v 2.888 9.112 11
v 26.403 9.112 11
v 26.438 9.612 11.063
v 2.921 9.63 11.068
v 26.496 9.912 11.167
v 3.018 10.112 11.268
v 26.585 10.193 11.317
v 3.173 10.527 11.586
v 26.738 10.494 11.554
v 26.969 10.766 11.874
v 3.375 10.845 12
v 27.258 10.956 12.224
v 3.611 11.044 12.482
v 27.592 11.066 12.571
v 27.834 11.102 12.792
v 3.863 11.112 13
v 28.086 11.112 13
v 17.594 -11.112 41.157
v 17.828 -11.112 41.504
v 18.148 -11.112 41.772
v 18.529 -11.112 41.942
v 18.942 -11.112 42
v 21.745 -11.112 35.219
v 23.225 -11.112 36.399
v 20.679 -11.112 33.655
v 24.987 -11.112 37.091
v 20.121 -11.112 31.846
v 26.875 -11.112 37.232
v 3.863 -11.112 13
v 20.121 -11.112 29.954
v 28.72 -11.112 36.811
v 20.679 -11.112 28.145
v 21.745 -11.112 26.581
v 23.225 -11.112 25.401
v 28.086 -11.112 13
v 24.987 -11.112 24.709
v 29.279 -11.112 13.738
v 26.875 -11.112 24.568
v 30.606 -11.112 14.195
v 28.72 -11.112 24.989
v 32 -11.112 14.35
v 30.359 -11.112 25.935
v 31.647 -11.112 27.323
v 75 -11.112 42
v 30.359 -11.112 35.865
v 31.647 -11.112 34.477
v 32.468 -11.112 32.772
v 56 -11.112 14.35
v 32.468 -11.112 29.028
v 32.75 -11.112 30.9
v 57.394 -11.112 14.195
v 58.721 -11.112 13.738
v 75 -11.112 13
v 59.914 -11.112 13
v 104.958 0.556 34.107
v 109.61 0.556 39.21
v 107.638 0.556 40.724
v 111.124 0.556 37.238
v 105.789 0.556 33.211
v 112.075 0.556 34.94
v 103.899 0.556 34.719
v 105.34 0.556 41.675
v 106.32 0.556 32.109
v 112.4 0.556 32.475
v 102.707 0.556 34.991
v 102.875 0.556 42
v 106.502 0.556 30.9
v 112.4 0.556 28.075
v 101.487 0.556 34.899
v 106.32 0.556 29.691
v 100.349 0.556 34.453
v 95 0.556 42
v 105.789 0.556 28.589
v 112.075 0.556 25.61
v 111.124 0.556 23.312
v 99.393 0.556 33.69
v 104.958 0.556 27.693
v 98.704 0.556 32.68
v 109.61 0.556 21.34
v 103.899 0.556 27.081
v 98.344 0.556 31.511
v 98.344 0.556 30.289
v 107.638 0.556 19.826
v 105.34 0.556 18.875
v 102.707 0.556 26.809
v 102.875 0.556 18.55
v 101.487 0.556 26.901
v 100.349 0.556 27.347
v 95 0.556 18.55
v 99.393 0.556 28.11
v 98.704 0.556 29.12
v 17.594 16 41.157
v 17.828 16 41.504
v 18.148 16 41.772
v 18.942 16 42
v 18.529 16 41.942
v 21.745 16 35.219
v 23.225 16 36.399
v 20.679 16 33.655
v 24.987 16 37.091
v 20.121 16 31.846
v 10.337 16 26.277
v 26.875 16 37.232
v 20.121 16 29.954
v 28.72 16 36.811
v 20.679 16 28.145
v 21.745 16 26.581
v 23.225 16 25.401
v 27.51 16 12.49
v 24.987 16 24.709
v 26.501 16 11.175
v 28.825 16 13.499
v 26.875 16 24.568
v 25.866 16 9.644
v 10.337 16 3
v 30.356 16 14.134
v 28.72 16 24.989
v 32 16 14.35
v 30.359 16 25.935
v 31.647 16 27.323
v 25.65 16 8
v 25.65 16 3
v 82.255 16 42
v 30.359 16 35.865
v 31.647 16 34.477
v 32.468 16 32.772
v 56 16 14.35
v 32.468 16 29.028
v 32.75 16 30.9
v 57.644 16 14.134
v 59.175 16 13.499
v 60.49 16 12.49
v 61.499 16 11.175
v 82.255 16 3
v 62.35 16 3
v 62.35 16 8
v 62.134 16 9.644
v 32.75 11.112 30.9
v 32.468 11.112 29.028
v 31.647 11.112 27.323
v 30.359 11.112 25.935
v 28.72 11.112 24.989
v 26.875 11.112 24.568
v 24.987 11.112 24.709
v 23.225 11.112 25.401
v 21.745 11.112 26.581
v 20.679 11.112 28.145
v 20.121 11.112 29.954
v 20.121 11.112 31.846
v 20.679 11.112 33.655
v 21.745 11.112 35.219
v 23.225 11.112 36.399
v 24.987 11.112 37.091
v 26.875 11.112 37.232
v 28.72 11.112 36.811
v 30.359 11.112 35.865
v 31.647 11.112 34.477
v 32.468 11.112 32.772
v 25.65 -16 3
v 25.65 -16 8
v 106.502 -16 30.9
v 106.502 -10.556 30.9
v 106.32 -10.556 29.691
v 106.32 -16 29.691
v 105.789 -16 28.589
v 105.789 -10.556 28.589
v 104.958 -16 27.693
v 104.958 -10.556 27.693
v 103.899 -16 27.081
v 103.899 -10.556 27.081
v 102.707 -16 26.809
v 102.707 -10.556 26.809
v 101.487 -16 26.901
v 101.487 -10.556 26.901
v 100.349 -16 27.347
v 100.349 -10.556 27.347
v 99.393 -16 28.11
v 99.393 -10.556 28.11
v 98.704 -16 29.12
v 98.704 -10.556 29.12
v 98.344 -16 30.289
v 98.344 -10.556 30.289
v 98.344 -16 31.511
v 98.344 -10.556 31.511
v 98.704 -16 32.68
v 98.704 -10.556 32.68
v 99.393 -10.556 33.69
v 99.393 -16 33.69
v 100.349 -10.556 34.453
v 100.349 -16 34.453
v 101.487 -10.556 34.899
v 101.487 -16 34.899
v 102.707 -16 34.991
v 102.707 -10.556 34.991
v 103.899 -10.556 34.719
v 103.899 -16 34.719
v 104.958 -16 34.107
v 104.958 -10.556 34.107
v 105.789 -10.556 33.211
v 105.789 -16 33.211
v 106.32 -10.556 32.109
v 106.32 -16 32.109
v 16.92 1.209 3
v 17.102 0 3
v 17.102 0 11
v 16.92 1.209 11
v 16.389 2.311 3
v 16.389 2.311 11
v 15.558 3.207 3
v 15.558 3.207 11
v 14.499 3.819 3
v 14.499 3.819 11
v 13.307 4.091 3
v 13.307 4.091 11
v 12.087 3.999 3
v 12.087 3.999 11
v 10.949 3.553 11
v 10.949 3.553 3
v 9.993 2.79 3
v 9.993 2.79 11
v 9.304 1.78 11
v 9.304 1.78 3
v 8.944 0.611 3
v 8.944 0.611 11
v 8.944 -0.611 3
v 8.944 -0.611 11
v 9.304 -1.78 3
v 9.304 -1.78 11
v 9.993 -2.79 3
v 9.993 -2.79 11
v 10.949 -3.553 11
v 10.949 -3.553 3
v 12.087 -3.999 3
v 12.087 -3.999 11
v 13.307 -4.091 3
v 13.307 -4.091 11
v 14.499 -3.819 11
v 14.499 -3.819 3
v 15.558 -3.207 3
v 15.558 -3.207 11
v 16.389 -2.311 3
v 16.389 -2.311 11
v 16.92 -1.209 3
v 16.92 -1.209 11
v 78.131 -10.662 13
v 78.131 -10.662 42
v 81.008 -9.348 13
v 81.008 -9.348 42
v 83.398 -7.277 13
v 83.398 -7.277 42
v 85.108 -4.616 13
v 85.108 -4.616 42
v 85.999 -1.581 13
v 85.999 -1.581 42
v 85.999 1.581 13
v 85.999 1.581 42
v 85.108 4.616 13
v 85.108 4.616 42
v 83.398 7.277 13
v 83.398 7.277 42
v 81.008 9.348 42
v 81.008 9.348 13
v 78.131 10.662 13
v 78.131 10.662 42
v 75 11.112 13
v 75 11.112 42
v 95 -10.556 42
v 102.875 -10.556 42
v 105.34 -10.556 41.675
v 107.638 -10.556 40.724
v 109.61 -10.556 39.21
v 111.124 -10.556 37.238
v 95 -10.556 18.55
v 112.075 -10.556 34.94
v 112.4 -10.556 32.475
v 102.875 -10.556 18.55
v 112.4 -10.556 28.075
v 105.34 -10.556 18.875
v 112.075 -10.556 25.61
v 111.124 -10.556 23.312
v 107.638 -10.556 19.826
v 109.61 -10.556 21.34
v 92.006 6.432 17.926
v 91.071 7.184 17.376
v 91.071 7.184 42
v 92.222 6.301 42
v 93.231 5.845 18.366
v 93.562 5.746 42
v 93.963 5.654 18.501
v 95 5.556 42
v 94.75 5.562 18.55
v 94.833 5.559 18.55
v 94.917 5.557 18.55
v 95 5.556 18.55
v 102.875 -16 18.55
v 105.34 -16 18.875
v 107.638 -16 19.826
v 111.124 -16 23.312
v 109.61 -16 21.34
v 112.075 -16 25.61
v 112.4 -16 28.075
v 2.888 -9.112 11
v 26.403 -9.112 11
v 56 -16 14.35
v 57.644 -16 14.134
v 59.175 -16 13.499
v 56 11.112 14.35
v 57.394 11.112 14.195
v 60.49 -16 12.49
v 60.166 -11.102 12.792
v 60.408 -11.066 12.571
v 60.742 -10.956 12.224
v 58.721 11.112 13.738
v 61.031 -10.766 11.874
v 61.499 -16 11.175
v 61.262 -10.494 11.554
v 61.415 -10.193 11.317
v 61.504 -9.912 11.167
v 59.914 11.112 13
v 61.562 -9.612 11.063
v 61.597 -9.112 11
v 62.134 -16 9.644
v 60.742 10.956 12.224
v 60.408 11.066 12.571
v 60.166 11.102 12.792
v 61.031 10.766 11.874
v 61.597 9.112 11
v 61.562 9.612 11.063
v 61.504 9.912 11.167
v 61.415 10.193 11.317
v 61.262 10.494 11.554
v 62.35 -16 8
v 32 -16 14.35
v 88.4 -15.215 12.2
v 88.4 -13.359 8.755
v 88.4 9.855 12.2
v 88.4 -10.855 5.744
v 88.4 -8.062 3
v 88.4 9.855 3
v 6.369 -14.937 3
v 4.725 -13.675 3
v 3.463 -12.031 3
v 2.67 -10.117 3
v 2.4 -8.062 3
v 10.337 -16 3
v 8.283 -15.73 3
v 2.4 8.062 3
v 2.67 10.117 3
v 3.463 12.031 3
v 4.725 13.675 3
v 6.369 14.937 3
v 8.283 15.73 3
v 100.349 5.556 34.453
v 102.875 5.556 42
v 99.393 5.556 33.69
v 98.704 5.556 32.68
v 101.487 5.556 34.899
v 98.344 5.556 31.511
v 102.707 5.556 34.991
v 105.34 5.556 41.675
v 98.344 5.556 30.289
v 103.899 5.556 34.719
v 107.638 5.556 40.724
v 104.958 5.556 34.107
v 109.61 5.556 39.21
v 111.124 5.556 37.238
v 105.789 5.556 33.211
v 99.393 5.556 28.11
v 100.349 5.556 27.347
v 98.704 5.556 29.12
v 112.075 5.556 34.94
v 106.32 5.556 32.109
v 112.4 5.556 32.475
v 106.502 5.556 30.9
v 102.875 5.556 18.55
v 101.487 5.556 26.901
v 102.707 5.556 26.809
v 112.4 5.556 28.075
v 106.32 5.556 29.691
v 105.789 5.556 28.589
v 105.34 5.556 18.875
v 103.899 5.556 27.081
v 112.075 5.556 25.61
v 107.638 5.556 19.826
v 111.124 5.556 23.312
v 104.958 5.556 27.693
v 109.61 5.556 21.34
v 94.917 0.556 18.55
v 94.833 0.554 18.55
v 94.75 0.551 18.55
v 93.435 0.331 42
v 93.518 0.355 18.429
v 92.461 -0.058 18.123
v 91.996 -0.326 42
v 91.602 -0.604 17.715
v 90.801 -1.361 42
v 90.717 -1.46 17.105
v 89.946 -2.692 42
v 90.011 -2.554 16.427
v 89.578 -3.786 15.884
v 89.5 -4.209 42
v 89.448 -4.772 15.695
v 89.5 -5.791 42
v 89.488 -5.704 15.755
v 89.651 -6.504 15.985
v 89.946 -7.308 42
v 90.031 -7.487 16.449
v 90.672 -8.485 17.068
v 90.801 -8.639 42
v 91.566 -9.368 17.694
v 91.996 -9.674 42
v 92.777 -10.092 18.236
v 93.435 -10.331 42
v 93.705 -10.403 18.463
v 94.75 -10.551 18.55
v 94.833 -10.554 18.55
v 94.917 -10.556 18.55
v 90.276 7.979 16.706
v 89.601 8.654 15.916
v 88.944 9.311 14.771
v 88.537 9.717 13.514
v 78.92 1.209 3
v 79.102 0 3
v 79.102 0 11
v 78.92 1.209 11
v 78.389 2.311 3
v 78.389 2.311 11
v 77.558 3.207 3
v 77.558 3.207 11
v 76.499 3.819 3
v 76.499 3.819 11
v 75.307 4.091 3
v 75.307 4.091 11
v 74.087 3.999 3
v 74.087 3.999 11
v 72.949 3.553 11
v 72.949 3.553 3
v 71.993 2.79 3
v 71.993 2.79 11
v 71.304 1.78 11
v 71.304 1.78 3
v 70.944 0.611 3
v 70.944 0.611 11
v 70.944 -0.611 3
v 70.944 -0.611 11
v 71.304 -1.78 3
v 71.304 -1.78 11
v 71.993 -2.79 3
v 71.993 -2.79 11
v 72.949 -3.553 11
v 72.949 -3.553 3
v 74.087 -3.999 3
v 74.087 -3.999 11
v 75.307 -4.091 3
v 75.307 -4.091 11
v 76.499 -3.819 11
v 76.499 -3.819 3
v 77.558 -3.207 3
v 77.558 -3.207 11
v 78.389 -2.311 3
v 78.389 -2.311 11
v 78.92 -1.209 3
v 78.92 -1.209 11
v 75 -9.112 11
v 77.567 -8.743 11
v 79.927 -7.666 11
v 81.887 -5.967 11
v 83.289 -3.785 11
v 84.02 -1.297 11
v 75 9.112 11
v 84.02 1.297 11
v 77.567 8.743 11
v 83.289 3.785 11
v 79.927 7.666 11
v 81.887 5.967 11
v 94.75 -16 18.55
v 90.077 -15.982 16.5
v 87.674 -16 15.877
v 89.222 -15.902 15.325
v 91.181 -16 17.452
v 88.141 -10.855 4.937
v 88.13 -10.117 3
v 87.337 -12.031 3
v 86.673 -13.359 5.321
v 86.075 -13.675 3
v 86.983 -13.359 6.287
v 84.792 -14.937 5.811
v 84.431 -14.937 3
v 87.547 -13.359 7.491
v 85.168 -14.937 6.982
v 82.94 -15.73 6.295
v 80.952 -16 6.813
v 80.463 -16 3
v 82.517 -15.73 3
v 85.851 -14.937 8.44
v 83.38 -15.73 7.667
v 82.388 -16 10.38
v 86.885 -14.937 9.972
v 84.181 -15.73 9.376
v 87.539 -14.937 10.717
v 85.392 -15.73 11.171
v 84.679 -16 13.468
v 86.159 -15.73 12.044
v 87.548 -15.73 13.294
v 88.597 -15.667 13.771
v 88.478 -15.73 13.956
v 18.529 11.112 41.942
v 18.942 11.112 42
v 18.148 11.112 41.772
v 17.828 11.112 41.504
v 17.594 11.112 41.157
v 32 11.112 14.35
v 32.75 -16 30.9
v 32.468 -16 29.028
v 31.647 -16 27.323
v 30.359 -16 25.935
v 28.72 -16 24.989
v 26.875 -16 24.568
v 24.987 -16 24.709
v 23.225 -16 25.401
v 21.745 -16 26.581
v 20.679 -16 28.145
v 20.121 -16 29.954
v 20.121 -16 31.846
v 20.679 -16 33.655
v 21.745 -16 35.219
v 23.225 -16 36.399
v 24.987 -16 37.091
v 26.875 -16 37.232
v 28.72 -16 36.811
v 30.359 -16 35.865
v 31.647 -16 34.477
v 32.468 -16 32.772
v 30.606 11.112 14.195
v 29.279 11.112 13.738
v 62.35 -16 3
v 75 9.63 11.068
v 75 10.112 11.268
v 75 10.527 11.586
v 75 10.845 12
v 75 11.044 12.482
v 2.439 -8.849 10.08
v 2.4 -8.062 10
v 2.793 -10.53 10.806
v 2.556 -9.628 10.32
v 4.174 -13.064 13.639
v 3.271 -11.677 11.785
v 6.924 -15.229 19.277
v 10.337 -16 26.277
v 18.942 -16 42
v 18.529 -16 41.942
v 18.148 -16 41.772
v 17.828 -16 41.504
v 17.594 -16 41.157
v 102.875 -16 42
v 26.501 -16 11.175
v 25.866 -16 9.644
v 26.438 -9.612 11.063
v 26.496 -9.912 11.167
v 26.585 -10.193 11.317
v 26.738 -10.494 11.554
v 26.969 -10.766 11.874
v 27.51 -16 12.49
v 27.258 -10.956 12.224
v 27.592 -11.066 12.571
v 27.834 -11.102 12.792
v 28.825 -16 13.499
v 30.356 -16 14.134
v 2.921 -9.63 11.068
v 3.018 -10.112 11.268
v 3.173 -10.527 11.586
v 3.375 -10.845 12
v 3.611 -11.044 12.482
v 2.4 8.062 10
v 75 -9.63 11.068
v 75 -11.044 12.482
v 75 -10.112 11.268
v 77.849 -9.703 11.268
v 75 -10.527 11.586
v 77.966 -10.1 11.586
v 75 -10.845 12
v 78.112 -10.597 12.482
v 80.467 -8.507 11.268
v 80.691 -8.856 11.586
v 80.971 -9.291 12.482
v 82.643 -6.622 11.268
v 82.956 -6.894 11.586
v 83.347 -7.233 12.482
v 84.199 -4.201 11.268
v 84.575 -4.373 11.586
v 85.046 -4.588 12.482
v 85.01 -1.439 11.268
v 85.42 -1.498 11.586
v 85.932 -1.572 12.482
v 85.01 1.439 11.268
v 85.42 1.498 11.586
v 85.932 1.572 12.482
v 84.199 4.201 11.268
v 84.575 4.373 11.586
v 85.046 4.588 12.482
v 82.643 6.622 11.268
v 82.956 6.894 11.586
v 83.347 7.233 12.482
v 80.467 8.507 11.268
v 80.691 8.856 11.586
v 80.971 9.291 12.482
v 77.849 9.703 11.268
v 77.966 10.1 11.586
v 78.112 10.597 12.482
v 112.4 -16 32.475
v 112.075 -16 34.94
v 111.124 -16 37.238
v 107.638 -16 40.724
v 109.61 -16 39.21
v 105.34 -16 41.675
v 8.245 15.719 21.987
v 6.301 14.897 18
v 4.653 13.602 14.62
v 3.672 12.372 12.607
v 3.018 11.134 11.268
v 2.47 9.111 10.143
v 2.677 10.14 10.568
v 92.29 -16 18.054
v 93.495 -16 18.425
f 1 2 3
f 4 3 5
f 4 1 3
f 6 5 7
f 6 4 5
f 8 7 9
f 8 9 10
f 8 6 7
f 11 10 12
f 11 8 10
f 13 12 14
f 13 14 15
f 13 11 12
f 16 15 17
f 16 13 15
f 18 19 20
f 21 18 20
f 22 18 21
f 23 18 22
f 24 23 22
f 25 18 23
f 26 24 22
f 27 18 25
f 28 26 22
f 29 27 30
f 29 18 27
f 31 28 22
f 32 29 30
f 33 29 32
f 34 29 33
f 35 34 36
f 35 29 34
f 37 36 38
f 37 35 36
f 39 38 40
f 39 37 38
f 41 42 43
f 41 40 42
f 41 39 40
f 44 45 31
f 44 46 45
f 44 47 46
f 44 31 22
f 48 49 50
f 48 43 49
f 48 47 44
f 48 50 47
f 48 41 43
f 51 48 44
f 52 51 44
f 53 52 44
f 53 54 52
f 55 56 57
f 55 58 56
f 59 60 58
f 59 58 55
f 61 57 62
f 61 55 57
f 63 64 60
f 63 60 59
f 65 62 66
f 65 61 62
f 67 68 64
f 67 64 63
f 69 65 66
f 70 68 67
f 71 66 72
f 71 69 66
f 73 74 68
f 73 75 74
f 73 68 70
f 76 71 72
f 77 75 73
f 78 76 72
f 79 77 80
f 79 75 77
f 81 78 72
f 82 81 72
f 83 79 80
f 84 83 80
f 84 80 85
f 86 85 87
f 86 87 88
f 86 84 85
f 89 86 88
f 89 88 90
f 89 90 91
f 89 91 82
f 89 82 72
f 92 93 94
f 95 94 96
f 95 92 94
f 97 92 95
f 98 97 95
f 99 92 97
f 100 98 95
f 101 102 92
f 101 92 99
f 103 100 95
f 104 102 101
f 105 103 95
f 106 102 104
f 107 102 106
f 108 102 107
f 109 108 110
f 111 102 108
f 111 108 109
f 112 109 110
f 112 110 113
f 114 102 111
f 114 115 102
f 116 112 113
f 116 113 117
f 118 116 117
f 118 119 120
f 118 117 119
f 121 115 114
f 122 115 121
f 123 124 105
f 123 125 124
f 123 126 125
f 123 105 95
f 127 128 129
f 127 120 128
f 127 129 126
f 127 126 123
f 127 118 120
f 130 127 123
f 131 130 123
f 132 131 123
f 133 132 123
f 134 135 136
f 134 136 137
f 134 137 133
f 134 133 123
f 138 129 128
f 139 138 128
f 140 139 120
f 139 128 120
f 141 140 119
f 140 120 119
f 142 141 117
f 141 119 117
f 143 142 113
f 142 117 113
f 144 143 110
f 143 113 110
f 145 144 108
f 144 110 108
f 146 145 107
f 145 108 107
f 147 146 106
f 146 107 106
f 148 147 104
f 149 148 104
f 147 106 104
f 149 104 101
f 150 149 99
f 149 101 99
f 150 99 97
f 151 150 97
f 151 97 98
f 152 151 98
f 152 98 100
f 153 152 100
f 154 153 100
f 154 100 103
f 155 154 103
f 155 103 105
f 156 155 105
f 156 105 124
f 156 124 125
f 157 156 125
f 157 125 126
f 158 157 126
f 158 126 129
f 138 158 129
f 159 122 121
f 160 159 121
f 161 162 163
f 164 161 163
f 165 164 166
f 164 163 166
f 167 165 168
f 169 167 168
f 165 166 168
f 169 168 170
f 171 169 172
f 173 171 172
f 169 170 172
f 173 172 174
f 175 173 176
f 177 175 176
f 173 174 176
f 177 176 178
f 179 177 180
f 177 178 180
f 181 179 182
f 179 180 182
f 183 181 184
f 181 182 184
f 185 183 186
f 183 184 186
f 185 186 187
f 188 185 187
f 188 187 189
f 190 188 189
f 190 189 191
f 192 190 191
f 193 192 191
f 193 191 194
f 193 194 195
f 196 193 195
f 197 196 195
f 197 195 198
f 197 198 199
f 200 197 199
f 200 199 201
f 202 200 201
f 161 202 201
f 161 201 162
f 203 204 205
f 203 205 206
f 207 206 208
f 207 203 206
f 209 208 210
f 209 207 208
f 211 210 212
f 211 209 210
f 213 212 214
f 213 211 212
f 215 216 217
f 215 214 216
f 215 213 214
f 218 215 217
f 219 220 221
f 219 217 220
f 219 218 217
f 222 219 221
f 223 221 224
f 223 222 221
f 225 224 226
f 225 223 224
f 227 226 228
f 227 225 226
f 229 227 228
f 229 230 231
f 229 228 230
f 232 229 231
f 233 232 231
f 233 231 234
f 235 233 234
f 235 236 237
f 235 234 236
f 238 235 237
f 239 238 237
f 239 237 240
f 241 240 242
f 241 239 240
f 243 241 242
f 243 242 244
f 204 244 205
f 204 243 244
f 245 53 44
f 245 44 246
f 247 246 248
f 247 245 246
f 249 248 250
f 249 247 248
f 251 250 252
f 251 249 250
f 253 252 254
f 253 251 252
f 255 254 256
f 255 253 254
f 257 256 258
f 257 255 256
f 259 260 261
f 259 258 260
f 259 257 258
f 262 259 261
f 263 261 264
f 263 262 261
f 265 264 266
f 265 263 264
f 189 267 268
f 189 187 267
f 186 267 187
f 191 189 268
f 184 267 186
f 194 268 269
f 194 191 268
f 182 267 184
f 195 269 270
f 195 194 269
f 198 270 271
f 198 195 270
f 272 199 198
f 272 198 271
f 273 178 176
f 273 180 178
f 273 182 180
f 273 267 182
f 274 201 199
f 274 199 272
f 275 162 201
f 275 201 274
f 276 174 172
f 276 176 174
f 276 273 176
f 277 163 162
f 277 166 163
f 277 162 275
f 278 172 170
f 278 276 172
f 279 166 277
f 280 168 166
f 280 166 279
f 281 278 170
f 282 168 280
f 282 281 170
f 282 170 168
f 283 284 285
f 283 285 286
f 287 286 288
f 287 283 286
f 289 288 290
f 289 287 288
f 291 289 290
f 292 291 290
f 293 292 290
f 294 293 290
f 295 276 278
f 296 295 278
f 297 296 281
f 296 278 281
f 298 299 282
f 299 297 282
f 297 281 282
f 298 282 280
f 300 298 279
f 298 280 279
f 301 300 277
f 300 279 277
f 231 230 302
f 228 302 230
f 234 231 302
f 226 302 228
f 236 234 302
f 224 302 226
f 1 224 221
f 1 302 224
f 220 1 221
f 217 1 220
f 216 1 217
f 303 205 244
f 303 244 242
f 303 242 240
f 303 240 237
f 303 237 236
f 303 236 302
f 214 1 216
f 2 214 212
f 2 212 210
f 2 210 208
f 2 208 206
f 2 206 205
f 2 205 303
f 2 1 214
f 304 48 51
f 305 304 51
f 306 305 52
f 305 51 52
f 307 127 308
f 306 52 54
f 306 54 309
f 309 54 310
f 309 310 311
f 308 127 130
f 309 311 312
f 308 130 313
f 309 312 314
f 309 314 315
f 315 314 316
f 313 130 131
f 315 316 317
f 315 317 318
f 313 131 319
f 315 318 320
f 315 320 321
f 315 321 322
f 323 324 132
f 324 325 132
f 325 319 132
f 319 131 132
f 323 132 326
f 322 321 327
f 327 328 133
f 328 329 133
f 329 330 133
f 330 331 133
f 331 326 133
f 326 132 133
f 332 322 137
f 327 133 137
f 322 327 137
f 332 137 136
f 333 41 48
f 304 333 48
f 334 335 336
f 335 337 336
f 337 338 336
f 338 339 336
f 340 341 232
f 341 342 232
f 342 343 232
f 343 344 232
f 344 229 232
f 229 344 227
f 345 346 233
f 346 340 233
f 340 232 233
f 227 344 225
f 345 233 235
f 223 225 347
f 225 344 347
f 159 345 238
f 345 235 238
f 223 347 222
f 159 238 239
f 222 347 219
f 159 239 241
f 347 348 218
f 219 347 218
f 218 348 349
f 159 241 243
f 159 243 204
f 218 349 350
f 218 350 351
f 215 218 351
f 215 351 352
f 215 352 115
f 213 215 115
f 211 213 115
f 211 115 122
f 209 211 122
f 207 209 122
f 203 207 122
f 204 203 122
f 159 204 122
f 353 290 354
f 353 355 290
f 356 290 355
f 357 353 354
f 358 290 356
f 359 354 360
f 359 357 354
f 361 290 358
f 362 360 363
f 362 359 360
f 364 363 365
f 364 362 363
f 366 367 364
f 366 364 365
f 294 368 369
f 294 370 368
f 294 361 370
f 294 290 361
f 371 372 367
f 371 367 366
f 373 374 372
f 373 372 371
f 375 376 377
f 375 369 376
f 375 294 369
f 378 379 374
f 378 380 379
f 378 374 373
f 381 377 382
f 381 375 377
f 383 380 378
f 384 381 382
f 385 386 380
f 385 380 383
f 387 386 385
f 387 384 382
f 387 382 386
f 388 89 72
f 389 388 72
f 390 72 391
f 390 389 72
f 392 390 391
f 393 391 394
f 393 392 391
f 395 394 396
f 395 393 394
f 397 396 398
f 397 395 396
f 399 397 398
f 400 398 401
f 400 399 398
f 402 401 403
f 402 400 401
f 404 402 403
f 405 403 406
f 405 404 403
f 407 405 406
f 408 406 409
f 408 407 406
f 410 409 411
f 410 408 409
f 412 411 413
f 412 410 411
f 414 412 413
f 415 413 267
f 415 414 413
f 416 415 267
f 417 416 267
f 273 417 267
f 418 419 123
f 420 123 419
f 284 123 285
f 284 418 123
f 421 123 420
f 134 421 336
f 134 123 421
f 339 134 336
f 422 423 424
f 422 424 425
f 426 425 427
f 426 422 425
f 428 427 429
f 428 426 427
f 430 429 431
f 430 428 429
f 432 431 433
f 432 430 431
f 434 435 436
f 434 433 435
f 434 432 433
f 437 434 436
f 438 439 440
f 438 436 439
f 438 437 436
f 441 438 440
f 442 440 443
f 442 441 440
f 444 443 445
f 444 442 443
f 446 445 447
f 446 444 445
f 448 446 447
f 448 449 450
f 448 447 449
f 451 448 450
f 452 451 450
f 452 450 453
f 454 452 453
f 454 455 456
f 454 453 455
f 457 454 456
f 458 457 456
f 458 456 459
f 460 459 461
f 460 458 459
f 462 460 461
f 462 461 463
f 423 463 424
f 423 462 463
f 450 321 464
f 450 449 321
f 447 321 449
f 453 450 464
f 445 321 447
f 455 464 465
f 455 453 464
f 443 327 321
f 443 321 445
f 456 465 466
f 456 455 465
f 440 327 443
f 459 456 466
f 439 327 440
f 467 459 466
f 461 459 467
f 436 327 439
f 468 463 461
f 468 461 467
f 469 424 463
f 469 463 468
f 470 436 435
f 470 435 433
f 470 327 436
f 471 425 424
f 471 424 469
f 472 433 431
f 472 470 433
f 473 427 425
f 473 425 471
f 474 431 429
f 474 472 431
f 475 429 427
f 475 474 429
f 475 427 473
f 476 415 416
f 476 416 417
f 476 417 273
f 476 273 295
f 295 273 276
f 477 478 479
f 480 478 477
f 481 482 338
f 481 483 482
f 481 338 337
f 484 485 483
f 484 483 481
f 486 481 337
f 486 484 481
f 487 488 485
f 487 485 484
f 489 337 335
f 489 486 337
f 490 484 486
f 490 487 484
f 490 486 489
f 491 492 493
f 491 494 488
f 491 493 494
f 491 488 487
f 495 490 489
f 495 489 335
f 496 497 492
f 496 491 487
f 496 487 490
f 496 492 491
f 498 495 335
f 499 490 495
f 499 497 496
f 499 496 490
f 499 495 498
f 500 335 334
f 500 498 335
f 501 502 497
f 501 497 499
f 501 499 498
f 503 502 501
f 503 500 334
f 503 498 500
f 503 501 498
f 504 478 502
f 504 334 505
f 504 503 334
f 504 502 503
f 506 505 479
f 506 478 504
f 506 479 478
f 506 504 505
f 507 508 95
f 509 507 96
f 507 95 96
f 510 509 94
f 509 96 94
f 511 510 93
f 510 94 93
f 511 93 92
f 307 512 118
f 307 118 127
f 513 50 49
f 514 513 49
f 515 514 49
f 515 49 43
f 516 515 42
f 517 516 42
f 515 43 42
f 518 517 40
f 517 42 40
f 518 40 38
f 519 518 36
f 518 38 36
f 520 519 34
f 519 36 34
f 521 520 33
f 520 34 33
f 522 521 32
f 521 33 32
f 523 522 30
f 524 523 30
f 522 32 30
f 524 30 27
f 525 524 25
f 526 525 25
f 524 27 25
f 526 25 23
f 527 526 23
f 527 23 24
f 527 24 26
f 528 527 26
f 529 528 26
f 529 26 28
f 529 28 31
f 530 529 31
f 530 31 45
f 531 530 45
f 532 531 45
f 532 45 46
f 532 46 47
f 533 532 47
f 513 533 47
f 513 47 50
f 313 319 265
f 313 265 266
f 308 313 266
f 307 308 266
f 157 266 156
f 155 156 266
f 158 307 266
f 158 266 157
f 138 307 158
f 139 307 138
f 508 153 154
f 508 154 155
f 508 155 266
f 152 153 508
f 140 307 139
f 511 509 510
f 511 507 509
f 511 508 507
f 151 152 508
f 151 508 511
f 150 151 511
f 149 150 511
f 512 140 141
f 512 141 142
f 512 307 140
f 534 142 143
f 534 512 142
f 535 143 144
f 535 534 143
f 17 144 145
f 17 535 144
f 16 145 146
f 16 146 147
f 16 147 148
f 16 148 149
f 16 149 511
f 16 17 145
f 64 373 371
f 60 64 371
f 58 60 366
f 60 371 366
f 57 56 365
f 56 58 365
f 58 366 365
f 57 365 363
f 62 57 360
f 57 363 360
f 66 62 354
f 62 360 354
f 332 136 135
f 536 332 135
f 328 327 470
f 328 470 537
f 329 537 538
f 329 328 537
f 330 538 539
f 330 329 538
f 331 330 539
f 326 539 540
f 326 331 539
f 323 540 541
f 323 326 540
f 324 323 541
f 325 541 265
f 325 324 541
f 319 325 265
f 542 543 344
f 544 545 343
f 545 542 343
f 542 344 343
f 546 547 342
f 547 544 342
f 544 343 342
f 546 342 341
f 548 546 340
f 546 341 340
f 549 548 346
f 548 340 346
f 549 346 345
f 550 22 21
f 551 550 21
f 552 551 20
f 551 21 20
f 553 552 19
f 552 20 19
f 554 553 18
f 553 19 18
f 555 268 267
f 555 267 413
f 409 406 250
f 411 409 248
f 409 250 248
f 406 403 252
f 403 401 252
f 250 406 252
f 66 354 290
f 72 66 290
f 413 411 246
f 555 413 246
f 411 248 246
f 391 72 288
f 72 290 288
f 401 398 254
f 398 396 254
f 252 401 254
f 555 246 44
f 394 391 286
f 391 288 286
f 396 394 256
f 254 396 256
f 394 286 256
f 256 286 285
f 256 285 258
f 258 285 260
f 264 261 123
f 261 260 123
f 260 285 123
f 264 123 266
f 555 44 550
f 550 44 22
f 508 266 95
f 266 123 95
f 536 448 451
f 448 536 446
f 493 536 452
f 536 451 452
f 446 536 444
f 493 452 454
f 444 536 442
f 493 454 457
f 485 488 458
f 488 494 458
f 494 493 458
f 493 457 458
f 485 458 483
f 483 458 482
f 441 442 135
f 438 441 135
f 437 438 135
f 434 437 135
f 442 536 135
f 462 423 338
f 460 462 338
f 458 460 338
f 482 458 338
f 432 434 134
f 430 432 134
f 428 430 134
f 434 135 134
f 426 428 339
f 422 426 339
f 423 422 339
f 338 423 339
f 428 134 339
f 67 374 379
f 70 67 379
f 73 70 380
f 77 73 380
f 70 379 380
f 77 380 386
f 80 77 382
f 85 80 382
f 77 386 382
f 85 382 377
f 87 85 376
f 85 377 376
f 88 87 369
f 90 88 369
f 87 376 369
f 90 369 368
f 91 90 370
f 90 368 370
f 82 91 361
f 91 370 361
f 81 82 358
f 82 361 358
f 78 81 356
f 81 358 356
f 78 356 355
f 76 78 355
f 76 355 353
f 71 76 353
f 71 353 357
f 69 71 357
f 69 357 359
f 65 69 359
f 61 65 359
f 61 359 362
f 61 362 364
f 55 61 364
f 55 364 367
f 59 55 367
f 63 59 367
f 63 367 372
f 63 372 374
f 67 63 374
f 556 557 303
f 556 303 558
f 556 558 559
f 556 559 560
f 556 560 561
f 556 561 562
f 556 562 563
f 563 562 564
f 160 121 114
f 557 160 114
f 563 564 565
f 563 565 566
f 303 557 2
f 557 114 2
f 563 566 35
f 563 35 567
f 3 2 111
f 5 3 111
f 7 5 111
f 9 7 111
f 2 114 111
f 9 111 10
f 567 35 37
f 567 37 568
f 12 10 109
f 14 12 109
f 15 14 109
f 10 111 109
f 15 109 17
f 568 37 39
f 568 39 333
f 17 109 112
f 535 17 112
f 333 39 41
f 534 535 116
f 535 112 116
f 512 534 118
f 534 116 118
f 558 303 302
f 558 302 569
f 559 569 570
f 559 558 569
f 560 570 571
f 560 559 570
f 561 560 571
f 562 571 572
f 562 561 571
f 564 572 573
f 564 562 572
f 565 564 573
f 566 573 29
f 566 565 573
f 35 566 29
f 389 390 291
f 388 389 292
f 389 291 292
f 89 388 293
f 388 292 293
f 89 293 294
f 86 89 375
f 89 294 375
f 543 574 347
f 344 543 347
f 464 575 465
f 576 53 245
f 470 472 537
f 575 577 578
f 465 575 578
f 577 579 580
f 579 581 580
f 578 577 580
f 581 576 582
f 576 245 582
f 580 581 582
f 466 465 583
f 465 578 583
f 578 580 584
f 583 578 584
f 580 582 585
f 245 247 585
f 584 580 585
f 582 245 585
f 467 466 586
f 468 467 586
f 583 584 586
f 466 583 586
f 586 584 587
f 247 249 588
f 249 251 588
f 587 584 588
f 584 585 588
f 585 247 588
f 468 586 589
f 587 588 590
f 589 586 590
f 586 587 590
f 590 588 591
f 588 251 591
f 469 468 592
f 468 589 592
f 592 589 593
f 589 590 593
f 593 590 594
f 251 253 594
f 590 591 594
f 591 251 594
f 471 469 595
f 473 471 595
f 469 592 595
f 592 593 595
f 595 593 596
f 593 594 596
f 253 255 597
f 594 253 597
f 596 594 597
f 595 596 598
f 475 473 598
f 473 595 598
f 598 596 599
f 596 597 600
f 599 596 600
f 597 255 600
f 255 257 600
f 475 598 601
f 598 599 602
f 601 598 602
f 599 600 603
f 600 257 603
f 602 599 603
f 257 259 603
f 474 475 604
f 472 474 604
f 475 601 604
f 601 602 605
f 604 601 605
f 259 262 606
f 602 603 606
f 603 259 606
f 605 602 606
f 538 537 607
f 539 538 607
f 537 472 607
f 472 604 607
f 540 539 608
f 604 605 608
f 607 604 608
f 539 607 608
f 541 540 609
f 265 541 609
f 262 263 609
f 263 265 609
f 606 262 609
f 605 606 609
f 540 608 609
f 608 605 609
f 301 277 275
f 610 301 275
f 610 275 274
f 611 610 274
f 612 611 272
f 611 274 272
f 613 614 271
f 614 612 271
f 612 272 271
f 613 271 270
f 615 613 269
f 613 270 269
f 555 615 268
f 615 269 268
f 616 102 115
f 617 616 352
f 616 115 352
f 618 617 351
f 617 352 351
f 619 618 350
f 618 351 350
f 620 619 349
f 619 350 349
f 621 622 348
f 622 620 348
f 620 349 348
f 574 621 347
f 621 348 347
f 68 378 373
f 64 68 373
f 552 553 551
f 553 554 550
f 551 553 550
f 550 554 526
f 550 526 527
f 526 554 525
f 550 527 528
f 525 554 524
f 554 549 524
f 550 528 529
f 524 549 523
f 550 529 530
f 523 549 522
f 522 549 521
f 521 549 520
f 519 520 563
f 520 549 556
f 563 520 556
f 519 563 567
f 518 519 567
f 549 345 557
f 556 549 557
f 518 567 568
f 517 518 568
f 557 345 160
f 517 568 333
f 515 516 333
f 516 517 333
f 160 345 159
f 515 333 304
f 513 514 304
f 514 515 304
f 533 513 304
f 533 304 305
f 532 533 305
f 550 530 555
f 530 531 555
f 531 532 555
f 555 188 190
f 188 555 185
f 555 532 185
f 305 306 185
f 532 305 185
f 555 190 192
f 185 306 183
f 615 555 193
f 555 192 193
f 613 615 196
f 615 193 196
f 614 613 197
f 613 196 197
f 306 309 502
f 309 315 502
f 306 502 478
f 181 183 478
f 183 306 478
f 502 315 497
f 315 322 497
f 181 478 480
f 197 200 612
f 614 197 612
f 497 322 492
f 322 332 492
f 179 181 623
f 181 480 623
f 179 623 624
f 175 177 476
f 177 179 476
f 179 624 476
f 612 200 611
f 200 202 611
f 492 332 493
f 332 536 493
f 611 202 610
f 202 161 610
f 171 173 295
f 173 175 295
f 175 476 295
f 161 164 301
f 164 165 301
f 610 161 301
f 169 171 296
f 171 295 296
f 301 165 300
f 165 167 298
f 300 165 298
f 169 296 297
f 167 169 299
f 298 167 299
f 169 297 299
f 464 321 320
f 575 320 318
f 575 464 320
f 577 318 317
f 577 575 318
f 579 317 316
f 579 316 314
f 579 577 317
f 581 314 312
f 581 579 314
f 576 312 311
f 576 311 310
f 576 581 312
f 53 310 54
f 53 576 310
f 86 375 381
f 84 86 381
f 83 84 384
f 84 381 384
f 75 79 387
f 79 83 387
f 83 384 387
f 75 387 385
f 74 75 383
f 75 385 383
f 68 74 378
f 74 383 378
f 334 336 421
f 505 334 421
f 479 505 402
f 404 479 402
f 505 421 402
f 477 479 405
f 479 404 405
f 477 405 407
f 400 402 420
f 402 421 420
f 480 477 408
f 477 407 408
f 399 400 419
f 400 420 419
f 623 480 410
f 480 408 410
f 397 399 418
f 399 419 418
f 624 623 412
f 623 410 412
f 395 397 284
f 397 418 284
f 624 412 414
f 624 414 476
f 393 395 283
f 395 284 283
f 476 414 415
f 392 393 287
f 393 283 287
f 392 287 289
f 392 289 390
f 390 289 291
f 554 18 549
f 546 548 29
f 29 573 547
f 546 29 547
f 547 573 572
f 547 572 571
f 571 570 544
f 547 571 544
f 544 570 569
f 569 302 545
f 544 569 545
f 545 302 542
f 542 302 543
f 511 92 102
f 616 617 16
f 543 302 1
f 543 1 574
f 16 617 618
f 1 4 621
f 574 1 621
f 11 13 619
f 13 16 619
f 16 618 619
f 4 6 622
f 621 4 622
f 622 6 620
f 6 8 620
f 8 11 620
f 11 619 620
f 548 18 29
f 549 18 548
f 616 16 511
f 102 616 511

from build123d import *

# Parameters (mm, degrees)
SKETCH1_W               = 120
SKETCH1_H               = 32
EXTRUDE1_DEPTH          = 75
CUT_EXTRUDE4_START      = 8
SKETCH2_OUTSIDE_W       = 151.016
SKETCH2_OUTSIDE_H       = 63.016
CUT_EXTRUDE4_DEPTH      = 68
EXTRUDE7_DEPTH          = 36.5252
SKETCH6_R               = 6.35
SKETCH6_R_2             = 4.1021
EXTRUDE4_DEPTH          = 33
SKETCH8_OUTSIDE_W       = 151.016
SKETCH8_OUTSIDE_H       = 106.016
EXTRUDE8_DEPTH          = 33
SKETCH9_R               = 4.1021
CUT_EXTRUDE1_DEPTH      = 43.0000001
FILLET6_R               = 2
CUT_EXTRUDE2_DEPTH      = 17
CUT_EXTRUDE2_DEPTH_BACK = 17.0000001
SKETCH16_OUTSIDE_W      = 136.204
SKETCH16_OUTSIDE_H      = 58.204
CUT_EXTRUDE7_DEPTH      = 43.0000001


with BuildPart() as part:
    # Sketch1 → Extrude1 (new body)
    with BuildSketch(Plane.XY.offset(3)):
        with Locations((60, 0)):
            Rectangle(SKETCH1_W, SKETCH1_H)
    extrude(amount=EXTRUDE1_DEPTH)

    # Sketch2 outside → Cut-Extrude4 (cut, through all)
    with BuildSketch(Plane.XY.offset(3).offset(CUT_EXTRUDE4_START)):
        with Locations((60, 0)):
            Rectangle(SKETCH2_OUTSIDE_W, SKETCH2_OUTSIDE_H)
        with BuildLine():
            Line((0, 16), (82.254775894, 16))
            Line((82.254775894, 16), (91.071137947, 7.183637947))
            ThreePointArc((91.071137947, 7.183637947), (92.873715179, 5.979194347), (95, 5.55625))
            Line((95, 5.55625), (120, 5.55625))
            Line((120, 5.55625), (120, 0.55625))
            Line((120, 0.55625), (95, 0.55625))
            ThreePointArc((95, 0.55625), (89.44375, -5), (95, -10.55625))
            Line((95, -10.55625), (120, -10.55625))
            Line((120, -10.55625), (120, -16))
            Line((120, -16), (0, -16))
            Line((0, -16), (0, -11.1125))
            Line((0, -11.1125), (75, -11.1125))
            ThreePointArc((75, -11.1125), (86.1125, 0), (75, 11.1125))
            Line((75, 11.1125), (0, 11.1125))
            Line((0, 11.1125), (0, 16))
        make_face(mode=Mode.SUBTRACT)
    extrude(amount=CUT_EXTRUDE4_DEPTH, mode=Mode.SUBTRACT)

    # Sketch7 → Extrude7 (cut)
    with BuildSketch(Plane.XY):
        with BuildLine():
            Line((95, 5.55625), (120, 5.55625))
            Line((120, 5.55625), (133.084512724, 5.55625))
            Line((133.084512724, 5.55625), (133.084512724, 22.23007271))
            Line((133.084512724, 22.23007271), (82.254775894, 22.23007271))
            Line((82.254775894, 22.23007271), (82.254775894, 16))
            Line((82.254775894, 16), (91.071137947, 7.183637947))
            ThreePointArc((91.071137947, 7.183637947), (92.873715179, 5.979194347), (95, 5.55625))
        make_face()
    extrude(amount=EXTRUDE7_DEPTH, mode=Mode.SUBTRACT)

    # Sketch6 → Extrude4 (cut, through all)
    with BuildSketch(Plane(origin=(0, 16, 0), x_dir=(1, 0, 0), z_dir=(0, 1, 0))):
        with Locations((26.4, -30.9)):
            Circle(SKETCH6_R)
        with Locations((102.4, -30.9)):
            Circle(SKETCH6_R_2)
    extrude(amount=-EXTRUDE4_DEPTH, mode=Mode.SUBTRACT)

    # Sketch8 outside → Extrude8 (cut, through all)
    with BuildSketch(Plane(origin=(0, 16, 0), x_dir=(1, 0, 0), z_dir=(0, 1, 0))):
        with Locations((60, -40.5)):
            Rectangle(SKETCH8_OUTSIDE_W, SKETCH8_OUTSIDE_H)
        with BuildLine():
            Line((17.594193491, -41.157475527), (2.4, -10))
            Line((2.4, -10), (2.4, 17.886579673))
            Line((2.4, 17.886579673), (88.4, 17.886579673))
            Line((88.4, 17.886579673), (88.4, -12.2))
            ThreePointArc((88.4, -12.2), (90.259871939, -16.690128061), (94.75, -18.55))
            Line((94.75, -18.55), (102.875, -18.55))
            ThreePointArc((102.875, -18.55), (109.610192091, -21.339807909), (112.4, -28.075))
            Line((112.4, -28.075), (112.4, -32.475))
            ThreePointArc((112.4, -32.475), (109.610192091, -39.210192091), (102.875, -42))
            Line((102.875, -42), (18.942424158, -42))
            ThreePointArc((18.942424158, -42), (18.147506958, -41.772048209), (17.594193491, -41.157475527))
        make_face(mode=Mode.SUBTRACT)
    extrude(amount=-EXTRUDE8_DEPTH, mode=Mode.SUBTRACT)

    # Sketch9 → Cut-Extrude1 (cut, through all)
    with BuildSketch(Plane.XY):
        with Locations((13, 0)):
            Circle(SKETCH9_R)
        with Locations((75, 0)):
            Circle(SKETCH9_R)
    extrude(amount=CUT_EXTRUDE1_DEPTH, mode=Mode.SUBTRACT)

    # Fillet6
    fillet6_edges = [part.edges().sort_by_distance(p)[0] for p in [
        (38.943829021, 11.1125, 11),
        (86.1125, 0, 11),
        (38.943829021, -11.1125, 11),
    ]]
    fillet(fillet6_edges, radius=FILLET6_R)

    # Sketch10 → Cut-Extrude2 (cut, two sides)
    with BuildSketch(Plane(origin=(0, 0, 0), x_dir=(1, 0, 0), z_dir=(0, 1, 0))) as cut_extrude2_sk:
        with BuildLine():
            Line((32, -14.35), (56, -14.35))
            ThreePointArc((56, -14.35), (60.490128061, -12.490128061), (62.35, -8))
            Line((62.35, -8), (62.35, 20.451290564))
            Line((62.35, 20.451290564), (25.65, 20.451290564))
            Line((25.65, 20.451290564), (25.65, -8))
            ThreePointArc((25.65, -8), (27.509871939, -12.490128061), (32, -14.35))
        make_face()
    extrude(amount=CUT_EXTRUDE2_DEPTH, mode=Mode.SUBTRACT)
    extrude(cut_extrude2_sk.sketch, amount=-CUT_EXTRUDE2_DEPTH_BACK, mode=Mode.SUBTRACT)

    # Sketch16 outside → Cut-Extrude7 (cut, through all)
    with BuildSketch(Plane.XY):
        with Locations((57.4, 0)):
            Rectangle(SKETCH16_OUTSIDE_W, SKETCH16_OUTSIDE_H)
        with BuildLine():
            Line((2.4, 8.0625), (2.4, -8.0625))
            ThreePointArc((2.4, -8.0625), (4.724839924, -13.675160076), (10.3375, -16))
            Line((10.3375, -16), (122.688337856, -16))
            Line((122.688337856, -16), (122.688337856, 16))
            Line((122.688337856, 16), (10.3375, 16))
            ThreePointArc((10.3375, 16), (4.724839924, 13.675160076), (2.4, 8.0625))
        make_face(mode=Mode.SUBTRACT)
    extrude(amount=CUT_EXTRUDE7_DEPTH, mode=Mode.SUBTRACT)

    # Cut-Sweep1: sweep along a path in Sketch19
    with BuildLine(Plane.XZ.offset(16)) as cut_sweep1_path:
        ThreePointArc((88.4, 3), (90.498611985, 8.066497517), (95.565109502, 10.165109502))
    # Sketch17 → Cut-Sweep1 (sweep, cut)
    with BuildSketch(Plane(origin=(0, 0, 3), x_dir=(-1, 0, 0), z_dir=(0, 0, -1))):
        with BuildLine():
            Line((-80.4625, -16), (-80.4625, -23.337063984))
            Line((-80.4625, -23.337063984), (-92.369, -23.337063984))
            Line((-92.369, -23.337063984), (-92.369, -8.0625))
            Line((-92.369, -8.0625), (-88.4, -8.0625))
            ThreePointArc((-88.4, -8.0625), (-86.075160076, -13.675160076), (-80.4625, -16))
        make_face()
    sweep(path=cut_sweep1_path.line, mode=Mode.SUBTRACT)


solid = part.part
